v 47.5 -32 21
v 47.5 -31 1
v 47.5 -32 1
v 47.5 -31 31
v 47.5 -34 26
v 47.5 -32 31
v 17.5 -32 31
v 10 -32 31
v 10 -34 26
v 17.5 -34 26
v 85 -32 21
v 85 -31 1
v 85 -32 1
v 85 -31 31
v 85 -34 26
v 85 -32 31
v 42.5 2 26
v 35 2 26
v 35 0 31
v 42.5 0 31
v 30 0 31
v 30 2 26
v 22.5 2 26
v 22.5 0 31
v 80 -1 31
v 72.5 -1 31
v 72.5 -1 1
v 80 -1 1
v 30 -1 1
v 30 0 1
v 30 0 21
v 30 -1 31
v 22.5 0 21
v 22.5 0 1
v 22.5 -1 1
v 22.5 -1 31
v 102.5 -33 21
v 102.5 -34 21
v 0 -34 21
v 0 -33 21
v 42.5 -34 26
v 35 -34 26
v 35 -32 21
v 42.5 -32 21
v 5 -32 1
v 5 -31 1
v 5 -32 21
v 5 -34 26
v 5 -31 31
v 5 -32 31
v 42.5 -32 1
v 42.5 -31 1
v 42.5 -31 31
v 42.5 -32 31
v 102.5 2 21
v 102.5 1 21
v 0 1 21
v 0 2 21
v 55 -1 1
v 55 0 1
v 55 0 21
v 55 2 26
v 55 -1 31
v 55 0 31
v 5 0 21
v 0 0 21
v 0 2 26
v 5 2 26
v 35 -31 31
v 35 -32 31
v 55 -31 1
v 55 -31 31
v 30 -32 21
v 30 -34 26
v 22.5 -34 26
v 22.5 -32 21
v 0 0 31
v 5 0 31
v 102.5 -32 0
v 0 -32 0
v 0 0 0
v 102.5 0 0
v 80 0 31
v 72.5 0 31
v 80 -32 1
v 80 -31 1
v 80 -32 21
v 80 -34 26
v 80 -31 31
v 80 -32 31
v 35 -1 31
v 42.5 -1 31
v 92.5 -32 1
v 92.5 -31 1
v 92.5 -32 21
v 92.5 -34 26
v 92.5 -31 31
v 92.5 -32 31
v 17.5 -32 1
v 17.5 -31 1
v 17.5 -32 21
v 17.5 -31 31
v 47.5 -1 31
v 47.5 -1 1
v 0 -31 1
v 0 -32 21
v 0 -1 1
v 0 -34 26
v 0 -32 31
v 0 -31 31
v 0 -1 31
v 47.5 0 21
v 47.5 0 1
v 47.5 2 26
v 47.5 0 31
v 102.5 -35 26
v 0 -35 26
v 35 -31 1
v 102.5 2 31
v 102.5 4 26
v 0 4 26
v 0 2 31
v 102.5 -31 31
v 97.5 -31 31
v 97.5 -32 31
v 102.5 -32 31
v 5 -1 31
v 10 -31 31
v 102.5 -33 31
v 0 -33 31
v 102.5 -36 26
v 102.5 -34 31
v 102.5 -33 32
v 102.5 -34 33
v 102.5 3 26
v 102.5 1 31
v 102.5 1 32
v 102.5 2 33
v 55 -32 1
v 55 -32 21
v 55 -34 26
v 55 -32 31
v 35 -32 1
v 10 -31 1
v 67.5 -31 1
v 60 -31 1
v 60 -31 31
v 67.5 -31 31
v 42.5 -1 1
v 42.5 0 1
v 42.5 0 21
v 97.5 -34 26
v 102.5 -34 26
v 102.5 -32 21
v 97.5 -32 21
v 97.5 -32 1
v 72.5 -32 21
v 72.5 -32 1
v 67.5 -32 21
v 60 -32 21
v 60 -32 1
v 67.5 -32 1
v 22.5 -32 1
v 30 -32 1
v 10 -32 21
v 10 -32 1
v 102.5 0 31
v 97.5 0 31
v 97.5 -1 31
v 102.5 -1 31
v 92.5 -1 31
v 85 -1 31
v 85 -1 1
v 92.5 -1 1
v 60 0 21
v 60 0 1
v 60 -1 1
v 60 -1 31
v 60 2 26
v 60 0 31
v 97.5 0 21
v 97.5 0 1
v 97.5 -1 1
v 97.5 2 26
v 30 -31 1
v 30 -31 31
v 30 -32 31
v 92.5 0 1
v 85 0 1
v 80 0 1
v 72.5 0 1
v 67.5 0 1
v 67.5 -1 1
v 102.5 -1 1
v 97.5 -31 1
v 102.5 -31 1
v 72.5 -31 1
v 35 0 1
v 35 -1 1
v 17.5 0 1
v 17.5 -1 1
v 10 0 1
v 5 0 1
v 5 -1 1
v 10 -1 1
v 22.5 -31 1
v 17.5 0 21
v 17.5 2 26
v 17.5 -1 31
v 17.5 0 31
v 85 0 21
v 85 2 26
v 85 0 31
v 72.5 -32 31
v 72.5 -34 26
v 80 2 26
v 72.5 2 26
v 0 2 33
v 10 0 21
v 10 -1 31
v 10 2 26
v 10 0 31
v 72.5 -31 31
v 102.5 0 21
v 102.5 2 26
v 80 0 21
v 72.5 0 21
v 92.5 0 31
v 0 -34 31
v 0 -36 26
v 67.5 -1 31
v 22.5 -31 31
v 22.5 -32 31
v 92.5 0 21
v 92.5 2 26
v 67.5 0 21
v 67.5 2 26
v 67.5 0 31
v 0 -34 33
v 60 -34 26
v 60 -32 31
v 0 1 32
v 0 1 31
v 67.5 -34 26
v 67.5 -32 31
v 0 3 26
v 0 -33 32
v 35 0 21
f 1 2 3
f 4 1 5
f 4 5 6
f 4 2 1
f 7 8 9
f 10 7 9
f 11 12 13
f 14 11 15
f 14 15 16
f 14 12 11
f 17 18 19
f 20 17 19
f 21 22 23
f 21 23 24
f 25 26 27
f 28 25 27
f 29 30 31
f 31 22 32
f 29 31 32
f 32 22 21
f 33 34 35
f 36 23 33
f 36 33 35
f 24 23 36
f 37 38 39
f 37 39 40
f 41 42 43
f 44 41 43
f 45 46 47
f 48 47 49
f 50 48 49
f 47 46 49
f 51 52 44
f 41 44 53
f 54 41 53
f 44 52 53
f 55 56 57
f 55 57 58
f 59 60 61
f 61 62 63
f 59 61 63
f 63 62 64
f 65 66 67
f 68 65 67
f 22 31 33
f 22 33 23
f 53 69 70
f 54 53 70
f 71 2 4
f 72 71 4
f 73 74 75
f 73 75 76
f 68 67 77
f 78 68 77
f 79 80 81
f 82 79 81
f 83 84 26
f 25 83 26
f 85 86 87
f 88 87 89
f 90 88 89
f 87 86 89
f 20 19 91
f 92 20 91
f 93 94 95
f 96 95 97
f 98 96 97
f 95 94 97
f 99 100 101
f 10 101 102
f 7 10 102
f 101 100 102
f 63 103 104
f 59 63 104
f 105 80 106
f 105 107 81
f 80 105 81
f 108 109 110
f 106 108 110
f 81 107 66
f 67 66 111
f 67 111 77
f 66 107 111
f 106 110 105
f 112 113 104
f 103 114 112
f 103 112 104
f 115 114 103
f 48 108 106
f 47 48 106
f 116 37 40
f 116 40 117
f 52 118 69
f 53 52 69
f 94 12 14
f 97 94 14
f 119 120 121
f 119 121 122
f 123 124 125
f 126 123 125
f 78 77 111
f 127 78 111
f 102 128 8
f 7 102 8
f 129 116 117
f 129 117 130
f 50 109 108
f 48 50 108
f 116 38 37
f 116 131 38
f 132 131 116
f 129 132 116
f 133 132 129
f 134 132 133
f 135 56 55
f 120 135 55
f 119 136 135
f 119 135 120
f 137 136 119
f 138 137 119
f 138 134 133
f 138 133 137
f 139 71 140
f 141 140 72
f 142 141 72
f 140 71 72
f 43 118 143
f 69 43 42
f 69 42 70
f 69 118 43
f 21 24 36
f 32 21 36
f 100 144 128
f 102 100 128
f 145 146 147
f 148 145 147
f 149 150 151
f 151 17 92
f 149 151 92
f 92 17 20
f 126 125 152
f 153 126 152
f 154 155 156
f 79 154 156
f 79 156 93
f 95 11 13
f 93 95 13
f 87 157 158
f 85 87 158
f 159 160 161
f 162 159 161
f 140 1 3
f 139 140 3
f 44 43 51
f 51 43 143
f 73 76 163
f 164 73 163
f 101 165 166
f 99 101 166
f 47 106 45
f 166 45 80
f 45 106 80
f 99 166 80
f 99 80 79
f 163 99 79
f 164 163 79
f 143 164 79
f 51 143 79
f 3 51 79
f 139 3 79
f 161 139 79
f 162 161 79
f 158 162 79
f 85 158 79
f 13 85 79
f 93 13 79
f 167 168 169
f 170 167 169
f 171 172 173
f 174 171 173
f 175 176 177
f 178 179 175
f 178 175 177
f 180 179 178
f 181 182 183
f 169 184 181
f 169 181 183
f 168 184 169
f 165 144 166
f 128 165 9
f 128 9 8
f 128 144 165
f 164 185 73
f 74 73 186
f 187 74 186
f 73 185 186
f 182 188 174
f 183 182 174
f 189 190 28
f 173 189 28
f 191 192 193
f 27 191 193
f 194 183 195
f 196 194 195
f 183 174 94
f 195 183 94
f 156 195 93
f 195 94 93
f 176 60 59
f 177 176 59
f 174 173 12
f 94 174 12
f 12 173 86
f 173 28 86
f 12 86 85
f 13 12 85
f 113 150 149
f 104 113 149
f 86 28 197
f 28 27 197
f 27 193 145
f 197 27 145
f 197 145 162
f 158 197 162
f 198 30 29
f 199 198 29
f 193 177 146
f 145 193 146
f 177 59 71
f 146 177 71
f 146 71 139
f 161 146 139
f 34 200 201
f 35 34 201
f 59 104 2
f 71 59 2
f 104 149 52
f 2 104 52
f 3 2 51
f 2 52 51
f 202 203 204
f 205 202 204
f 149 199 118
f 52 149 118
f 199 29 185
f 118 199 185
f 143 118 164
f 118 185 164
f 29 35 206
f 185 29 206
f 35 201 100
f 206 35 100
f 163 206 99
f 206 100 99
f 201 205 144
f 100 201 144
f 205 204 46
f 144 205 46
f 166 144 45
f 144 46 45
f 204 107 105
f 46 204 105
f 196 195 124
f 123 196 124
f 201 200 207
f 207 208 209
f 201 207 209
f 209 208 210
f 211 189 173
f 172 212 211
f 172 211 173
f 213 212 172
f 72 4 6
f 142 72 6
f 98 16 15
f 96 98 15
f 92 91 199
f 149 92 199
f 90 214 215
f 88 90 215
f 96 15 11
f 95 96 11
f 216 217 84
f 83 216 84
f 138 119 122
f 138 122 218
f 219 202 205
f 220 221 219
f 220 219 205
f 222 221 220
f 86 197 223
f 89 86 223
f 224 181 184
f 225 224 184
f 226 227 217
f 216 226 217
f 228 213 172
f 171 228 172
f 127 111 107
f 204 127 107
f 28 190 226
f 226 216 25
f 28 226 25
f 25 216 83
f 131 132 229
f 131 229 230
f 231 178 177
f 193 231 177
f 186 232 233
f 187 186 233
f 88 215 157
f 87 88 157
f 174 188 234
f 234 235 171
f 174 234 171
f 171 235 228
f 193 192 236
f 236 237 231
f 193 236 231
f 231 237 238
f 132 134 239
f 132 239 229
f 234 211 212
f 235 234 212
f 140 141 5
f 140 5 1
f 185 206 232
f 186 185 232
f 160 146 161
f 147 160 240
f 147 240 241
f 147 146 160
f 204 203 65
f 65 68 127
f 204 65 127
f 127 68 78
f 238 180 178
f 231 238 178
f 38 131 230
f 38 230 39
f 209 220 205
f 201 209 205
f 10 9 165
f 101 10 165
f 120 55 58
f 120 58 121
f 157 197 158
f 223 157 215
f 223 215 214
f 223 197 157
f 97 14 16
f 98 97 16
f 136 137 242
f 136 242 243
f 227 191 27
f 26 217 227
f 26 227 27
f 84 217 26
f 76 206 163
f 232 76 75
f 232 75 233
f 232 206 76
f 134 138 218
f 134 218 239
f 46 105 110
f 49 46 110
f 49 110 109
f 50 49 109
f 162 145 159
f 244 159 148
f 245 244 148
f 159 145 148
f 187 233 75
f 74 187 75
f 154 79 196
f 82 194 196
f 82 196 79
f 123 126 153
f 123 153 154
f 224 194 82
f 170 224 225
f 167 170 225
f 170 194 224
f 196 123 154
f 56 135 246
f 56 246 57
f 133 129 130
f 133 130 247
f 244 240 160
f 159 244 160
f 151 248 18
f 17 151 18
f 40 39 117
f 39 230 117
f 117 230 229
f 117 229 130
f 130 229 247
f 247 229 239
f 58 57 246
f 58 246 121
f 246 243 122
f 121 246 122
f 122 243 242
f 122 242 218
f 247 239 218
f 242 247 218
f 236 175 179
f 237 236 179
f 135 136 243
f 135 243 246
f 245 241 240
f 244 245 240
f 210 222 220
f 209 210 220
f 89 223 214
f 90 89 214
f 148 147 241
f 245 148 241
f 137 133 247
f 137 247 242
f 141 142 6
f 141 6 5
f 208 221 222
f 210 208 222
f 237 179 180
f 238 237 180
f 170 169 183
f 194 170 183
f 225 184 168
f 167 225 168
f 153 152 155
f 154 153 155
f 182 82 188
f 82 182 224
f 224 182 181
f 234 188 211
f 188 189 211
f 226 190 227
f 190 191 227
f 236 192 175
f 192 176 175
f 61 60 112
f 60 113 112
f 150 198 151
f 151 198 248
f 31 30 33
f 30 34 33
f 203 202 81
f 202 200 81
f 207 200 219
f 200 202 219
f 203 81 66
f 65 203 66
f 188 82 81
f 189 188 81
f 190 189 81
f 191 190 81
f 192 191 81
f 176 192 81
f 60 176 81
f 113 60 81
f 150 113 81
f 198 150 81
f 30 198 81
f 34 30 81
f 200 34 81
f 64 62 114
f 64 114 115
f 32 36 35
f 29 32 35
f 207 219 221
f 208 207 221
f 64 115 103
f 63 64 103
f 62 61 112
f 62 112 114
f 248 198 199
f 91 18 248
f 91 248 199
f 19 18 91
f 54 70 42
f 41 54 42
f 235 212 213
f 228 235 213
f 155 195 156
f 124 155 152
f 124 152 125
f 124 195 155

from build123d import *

# Parameters (mm, degrees)
F1_DEPTH = 102.5
F2_W     = 5
F2_H     = 30
F3_DEPTH = 34.001
F4_DEPTH = 2.001
F6_DEPTH = 102.5


with BuildPart() as f1:
    # F0 (on Right) → F1 (new body)
    with BuildSketch(Plane.YZ):
        Polygon((-31, 31), (-32, 31), (-32, 26), (-32, 21), (-32, 0), (0, 0), (0, 21), (0, 26), (0, 31), (-1, 31), (-1, 1), (-31, 1), align=None)
        Polygon((-32, 26), (-32, 31), (-34, 26), align=None)
        Polygon((-32, 21), (-32, 26), (-34, 26), align=None)
        Polygon((0, 26), (0, 21), (2, 26), align=None)
        Polygon((2, 26), (0, 31), (0, 26), align=None)
    extrude(amount=F1_DEPTH)

    # F2 (on face) → F3 (cut, through all)
    with BuildSketch(Plane(origin=(0, 0, 0), x_dir=(-1, 0, 0), z_dir=(0, 1, 0))):
        with Locations((-95, 16)):
            Rectangle(F2_W, F2_H)
        with Locations((-82.5, 16)):
            Rectangle(F2_W, F2_H)
        with Locations((-70, 16)):
            Rectangle(F2_W, F2_H)
        with Locations((-57.5, 16)):
            Rectangle(F2_W, F2_H)
        with Locations((-45, 16)):
            Rectangle(F2_W, F2_H)
        with Locations((-32.5, 16)):
            Rectangle(F2_W, F2_H)
        with Locations((-20, 16)):
            Rectangle(F2_W, F2_H)
        with Locations((-7.5, 16)):
            Rectangle(F2_W, F2_H)
    extrude(amount=-F3_DEPTH, mode=Mode.SUBTRACT)

    # F2 (on face) → F4 (cut, through all)
    with BuildSketch(Plane(origin=(0, 0, 0), x_dir=(-1, 0, 0), z_dir=(0, 1, 0))):
        with Locations((-95, 16)):
            Rectangle(F2_W, F2_H)
        with Locations((-82.5, 16)):
            Rectangle(F2_W, F2_H)
        with Locations((-70, 16)):
            Rectangle(F2_W, F2_H)
        with Locations((-57.5, 16)):
            Rectangle(F2_W, F2_H)
        with Locations((-45, 16)):
            Rectangle(F2_W, F2_H)
        with Locations((-32.5, 16)):
            Rectangle(F2_W, F2_H)
        with Locations((-20, 16)):
            Rectangle(F2_W, F2_H)
        with Locations((-7.5, 16)):
            Rectangle(F2_W, F2_H)
    extrude(amount=F4_DEPTH, mode=Mode.SUBTRACT)


with BuildPart() as f6:
    # F5 (on face) → F6 (new body, through all)
    with BuildSketch(Plane.YZ.offset(102.5)):
        Polygon((-34, 21), (-33, 21), (-35, 26), (-33, 31), (-33, 32), (-34, 32), (-34, 31), (-36, 26), align=None)
        Polygon((-34, 32), (-33, 32), (1, 32), (2, 32), (2, 33), (-34, 33), align=None)
        Polygon((2, 32), (1, 32), (1, 31), (3, 26), (1, 21), (2, 21), (4, 26), (2, 31), align=None)
    extrude(amount=-F6_DEPTH)


solid = Compound([f1.part, f6.part])
